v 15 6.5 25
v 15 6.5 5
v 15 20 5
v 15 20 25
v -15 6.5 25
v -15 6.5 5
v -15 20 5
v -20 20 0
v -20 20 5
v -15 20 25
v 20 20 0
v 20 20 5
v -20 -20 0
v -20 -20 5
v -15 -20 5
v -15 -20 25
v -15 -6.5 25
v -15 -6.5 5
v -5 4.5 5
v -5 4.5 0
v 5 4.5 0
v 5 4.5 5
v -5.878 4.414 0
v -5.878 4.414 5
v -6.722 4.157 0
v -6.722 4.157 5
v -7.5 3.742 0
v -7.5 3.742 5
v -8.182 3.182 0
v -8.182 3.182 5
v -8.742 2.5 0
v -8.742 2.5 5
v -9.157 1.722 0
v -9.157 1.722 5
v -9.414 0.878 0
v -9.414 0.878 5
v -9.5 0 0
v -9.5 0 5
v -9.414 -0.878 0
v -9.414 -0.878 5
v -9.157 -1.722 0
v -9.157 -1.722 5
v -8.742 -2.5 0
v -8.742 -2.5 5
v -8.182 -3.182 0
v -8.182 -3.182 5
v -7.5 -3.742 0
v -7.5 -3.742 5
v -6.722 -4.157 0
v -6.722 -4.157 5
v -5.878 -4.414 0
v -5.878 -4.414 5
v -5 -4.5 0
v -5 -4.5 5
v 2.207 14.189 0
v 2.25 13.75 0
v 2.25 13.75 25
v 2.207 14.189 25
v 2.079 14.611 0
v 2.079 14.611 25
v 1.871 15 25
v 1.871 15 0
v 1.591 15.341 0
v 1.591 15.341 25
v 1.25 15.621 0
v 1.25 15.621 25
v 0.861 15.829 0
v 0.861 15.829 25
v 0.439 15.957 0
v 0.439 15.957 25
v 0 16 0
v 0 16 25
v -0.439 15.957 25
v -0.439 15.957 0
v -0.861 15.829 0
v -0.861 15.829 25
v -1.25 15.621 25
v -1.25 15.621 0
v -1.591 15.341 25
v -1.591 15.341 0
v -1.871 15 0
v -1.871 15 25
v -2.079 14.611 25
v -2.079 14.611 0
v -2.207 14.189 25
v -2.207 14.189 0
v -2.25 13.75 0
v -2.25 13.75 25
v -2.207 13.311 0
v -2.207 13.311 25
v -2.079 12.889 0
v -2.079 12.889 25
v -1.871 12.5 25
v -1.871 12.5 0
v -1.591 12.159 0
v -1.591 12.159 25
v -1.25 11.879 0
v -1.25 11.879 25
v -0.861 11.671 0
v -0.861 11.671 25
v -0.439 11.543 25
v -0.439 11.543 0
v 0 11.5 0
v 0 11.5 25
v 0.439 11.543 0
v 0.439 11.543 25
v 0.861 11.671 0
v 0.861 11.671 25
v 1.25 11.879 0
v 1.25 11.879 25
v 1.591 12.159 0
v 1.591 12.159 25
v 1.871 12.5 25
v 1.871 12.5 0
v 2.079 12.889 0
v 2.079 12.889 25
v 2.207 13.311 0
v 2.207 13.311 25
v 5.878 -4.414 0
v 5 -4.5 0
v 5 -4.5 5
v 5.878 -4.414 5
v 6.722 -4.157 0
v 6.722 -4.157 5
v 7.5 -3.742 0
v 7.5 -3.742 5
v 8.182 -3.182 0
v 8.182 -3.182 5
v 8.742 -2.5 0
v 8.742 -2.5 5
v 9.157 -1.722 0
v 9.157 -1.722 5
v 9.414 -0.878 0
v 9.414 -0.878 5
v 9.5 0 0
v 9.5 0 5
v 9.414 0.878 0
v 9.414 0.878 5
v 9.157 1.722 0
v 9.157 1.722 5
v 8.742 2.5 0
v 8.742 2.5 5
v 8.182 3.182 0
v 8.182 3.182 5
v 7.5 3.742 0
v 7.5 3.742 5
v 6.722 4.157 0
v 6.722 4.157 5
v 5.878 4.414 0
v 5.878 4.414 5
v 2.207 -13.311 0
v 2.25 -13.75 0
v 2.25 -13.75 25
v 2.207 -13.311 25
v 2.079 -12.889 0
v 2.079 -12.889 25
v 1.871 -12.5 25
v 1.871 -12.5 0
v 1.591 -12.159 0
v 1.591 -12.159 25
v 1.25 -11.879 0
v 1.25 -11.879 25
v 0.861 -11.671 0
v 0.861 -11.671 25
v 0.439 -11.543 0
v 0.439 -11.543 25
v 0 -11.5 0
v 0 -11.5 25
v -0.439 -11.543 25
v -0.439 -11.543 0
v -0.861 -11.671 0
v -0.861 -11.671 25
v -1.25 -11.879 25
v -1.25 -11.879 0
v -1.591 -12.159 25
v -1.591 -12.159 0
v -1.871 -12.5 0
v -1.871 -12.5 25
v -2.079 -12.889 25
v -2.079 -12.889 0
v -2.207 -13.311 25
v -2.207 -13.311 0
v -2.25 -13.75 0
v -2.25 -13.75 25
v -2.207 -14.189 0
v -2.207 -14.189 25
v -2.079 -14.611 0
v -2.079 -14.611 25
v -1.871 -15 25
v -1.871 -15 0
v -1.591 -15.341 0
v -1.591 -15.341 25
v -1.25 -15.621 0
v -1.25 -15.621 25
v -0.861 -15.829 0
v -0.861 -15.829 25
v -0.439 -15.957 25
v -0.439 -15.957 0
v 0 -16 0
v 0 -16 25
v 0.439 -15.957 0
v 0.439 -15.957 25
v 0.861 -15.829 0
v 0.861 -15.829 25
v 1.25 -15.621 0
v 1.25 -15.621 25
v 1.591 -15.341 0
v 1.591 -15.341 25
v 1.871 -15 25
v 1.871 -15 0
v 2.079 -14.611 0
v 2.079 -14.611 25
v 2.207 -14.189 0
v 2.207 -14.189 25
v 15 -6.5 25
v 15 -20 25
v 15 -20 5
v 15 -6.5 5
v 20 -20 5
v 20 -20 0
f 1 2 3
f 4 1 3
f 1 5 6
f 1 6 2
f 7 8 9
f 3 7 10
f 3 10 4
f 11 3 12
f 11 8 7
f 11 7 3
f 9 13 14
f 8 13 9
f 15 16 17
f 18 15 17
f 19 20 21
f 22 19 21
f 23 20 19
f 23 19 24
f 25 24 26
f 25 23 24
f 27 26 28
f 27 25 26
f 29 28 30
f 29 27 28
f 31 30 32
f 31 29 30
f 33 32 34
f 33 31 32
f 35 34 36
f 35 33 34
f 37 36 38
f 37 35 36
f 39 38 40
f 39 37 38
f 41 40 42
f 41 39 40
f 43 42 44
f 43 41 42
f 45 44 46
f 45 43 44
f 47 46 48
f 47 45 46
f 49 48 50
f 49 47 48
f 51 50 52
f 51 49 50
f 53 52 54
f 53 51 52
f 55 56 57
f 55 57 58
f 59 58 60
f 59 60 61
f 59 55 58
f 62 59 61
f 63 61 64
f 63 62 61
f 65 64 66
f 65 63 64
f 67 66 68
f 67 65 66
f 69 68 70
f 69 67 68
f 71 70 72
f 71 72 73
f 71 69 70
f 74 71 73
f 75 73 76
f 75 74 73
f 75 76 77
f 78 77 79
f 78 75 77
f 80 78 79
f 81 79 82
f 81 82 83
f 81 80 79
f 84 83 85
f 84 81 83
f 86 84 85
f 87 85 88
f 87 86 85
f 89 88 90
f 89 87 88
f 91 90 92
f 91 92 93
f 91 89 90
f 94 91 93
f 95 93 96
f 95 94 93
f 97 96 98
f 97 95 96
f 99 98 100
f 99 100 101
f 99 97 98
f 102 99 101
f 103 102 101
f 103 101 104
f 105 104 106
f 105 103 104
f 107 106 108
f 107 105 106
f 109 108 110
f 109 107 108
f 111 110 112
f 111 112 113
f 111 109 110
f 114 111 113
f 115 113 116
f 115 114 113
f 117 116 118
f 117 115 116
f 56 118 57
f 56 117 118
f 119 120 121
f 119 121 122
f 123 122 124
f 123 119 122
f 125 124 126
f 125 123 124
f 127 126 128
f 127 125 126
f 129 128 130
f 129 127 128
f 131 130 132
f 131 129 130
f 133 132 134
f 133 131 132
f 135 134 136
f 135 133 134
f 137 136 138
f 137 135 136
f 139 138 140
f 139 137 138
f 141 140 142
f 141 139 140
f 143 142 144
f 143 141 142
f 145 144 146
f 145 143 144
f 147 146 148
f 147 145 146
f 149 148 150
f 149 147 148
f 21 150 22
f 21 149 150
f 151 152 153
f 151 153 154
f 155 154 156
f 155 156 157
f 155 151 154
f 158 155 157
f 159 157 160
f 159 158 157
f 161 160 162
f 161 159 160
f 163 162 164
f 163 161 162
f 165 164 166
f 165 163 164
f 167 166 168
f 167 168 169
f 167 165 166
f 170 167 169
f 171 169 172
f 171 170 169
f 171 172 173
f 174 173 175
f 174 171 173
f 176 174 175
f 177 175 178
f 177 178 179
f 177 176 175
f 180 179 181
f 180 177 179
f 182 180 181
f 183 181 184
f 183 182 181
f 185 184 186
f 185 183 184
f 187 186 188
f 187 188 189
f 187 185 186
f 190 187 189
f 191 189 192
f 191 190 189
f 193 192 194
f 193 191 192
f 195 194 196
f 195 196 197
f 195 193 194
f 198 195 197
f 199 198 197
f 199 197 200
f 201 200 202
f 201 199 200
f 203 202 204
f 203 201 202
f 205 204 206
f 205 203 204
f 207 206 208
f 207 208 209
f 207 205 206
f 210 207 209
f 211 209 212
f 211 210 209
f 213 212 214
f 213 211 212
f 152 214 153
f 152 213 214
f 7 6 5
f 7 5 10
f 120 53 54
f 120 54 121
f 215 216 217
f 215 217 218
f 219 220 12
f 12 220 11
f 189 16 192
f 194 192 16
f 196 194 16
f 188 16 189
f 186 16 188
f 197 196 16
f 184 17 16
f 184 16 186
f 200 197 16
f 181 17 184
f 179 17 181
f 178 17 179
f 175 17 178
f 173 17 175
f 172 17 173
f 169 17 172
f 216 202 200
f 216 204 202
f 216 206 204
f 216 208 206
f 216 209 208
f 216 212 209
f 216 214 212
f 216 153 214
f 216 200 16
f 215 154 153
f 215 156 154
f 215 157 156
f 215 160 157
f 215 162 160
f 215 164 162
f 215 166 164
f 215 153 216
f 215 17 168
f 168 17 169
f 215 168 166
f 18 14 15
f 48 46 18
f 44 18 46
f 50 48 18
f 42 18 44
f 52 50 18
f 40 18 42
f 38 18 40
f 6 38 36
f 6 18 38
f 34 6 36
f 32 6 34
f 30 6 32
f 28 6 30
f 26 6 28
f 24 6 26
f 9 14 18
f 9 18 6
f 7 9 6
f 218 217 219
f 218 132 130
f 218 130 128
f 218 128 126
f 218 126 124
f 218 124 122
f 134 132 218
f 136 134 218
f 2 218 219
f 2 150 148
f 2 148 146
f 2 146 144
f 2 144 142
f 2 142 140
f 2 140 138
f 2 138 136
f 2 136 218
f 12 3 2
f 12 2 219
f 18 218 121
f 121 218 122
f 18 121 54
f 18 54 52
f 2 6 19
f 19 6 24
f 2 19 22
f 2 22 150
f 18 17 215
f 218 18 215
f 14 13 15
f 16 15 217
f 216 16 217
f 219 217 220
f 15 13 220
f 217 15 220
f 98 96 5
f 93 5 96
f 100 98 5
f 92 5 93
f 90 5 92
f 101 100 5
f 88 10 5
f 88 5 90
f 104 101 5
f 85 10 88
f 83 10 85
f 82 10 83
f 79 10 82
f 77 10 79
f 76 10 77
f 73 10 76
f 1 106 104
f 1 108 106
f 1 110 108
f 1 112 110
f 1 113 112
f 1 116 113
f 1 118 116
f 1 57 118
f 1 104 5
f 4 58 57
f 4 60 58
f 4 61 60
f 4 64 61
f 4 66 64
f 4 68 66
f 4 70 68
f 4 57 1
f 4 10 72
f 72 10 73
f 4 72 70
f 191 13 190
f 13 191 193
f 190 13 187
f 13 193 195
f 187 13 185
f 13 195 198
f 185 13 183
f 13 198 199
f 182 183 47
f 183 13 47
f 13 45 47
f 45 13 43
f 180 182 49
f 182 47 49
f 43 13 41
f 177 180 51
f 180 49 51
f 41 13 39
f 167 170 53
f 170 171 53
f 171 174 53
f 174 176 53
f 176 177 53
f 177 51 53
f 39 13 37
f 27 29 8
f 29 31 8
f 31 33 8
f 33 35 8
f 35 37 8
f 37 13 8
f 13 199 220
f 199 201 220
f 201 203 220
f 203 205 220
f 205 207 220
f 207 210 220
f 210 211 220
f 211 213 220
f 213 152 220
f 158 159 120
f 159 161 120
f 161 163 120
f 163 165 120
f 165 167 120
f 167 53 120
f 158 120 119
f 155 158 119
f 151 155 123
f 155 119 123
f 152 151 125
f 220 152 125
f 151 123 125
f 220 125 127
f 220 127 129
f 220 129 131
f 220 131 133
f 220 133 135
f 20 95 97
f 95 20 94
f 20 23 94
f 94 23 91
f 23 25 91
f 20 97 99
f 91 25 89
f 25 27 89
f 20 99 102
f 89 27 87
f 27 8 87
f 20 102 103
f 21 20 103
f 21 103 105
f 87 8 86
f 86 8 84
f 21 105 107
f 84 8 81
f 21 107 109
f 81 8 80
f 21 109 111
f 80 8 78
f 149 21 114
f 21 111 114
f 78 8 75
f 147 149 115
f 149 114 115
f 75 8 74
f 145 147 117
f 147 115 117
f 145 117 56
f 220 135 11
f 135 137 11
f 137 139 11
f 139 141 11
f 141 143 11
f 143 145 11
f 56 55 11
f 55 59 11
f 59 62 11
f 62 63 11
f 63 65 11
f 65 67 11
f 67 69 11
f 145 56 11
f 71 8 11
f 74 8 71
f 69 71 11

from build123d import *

# Parameters (mm, degrees)
SKETCH_W        = 40
SKETCH_H        = 40
SKETCH_R        = 2.25
PAD_DEPTH       = 25
SKETCH001_W     = 40
SKETCH001_H     = 13
POCKET_DEPTH    = 20
SKETCH002_W     = 6
SKETCH002_H     = 42
POCKET001_DEPTH = 20


with BuildPart() as part:
    # Sketch → Pad (new body)
    with BuildSketch(Plane.XY):
        Rectangle(SKETCH_W, SKETCH_H)
        with Locations((0, 13.75)):
            Circle(SKETCH_R, mode=Mode.SUBTRACT)
        with Locations((0, -13.75)):
            Circle(SKETCH_R, mode=Mode.SUBTRACT)
        with BuildLine():
            ThreePointArc((-4.999983, 4.5), (-9.499983, 9e-06), (-5, -4.5))
            Line((-5, -4.5), (5, -4.5))
            ThreePointArc((5, -4.5), (9.499983, 9e-06), (4.999983, 4.5))
            Line((-4.999983, 4.5), (4.999983, 4.5))
        make_face(mode=Mode.SUBTRACT)
    extrude(amount=PAD_DEPTH)

    # Sketch001 → Pocket (cut)
    with BuildSketch(Plane.XY.offset(25)):
        Rectangle(SKETCH001_W, SKETCH001_H)
    extrude(amount=-POCKET_DEPTH, mode=Mode.SUBTRACT)

    # Sketch002 → Pocket001 (cut)
    with BuildSketch(Plane.XY.offset(25)):
        with Locations((-18, 0)):
            Rectangle(SKETCH002_W, SKETCH002_H)
        with Locations((18, 0)):
            Rectangle(SKETCH002_W, SKETCH002_H)
    extrude(amount=-POCKET001_DEPTH, mode=Mode.SUBTRACT)


solid = part.part
